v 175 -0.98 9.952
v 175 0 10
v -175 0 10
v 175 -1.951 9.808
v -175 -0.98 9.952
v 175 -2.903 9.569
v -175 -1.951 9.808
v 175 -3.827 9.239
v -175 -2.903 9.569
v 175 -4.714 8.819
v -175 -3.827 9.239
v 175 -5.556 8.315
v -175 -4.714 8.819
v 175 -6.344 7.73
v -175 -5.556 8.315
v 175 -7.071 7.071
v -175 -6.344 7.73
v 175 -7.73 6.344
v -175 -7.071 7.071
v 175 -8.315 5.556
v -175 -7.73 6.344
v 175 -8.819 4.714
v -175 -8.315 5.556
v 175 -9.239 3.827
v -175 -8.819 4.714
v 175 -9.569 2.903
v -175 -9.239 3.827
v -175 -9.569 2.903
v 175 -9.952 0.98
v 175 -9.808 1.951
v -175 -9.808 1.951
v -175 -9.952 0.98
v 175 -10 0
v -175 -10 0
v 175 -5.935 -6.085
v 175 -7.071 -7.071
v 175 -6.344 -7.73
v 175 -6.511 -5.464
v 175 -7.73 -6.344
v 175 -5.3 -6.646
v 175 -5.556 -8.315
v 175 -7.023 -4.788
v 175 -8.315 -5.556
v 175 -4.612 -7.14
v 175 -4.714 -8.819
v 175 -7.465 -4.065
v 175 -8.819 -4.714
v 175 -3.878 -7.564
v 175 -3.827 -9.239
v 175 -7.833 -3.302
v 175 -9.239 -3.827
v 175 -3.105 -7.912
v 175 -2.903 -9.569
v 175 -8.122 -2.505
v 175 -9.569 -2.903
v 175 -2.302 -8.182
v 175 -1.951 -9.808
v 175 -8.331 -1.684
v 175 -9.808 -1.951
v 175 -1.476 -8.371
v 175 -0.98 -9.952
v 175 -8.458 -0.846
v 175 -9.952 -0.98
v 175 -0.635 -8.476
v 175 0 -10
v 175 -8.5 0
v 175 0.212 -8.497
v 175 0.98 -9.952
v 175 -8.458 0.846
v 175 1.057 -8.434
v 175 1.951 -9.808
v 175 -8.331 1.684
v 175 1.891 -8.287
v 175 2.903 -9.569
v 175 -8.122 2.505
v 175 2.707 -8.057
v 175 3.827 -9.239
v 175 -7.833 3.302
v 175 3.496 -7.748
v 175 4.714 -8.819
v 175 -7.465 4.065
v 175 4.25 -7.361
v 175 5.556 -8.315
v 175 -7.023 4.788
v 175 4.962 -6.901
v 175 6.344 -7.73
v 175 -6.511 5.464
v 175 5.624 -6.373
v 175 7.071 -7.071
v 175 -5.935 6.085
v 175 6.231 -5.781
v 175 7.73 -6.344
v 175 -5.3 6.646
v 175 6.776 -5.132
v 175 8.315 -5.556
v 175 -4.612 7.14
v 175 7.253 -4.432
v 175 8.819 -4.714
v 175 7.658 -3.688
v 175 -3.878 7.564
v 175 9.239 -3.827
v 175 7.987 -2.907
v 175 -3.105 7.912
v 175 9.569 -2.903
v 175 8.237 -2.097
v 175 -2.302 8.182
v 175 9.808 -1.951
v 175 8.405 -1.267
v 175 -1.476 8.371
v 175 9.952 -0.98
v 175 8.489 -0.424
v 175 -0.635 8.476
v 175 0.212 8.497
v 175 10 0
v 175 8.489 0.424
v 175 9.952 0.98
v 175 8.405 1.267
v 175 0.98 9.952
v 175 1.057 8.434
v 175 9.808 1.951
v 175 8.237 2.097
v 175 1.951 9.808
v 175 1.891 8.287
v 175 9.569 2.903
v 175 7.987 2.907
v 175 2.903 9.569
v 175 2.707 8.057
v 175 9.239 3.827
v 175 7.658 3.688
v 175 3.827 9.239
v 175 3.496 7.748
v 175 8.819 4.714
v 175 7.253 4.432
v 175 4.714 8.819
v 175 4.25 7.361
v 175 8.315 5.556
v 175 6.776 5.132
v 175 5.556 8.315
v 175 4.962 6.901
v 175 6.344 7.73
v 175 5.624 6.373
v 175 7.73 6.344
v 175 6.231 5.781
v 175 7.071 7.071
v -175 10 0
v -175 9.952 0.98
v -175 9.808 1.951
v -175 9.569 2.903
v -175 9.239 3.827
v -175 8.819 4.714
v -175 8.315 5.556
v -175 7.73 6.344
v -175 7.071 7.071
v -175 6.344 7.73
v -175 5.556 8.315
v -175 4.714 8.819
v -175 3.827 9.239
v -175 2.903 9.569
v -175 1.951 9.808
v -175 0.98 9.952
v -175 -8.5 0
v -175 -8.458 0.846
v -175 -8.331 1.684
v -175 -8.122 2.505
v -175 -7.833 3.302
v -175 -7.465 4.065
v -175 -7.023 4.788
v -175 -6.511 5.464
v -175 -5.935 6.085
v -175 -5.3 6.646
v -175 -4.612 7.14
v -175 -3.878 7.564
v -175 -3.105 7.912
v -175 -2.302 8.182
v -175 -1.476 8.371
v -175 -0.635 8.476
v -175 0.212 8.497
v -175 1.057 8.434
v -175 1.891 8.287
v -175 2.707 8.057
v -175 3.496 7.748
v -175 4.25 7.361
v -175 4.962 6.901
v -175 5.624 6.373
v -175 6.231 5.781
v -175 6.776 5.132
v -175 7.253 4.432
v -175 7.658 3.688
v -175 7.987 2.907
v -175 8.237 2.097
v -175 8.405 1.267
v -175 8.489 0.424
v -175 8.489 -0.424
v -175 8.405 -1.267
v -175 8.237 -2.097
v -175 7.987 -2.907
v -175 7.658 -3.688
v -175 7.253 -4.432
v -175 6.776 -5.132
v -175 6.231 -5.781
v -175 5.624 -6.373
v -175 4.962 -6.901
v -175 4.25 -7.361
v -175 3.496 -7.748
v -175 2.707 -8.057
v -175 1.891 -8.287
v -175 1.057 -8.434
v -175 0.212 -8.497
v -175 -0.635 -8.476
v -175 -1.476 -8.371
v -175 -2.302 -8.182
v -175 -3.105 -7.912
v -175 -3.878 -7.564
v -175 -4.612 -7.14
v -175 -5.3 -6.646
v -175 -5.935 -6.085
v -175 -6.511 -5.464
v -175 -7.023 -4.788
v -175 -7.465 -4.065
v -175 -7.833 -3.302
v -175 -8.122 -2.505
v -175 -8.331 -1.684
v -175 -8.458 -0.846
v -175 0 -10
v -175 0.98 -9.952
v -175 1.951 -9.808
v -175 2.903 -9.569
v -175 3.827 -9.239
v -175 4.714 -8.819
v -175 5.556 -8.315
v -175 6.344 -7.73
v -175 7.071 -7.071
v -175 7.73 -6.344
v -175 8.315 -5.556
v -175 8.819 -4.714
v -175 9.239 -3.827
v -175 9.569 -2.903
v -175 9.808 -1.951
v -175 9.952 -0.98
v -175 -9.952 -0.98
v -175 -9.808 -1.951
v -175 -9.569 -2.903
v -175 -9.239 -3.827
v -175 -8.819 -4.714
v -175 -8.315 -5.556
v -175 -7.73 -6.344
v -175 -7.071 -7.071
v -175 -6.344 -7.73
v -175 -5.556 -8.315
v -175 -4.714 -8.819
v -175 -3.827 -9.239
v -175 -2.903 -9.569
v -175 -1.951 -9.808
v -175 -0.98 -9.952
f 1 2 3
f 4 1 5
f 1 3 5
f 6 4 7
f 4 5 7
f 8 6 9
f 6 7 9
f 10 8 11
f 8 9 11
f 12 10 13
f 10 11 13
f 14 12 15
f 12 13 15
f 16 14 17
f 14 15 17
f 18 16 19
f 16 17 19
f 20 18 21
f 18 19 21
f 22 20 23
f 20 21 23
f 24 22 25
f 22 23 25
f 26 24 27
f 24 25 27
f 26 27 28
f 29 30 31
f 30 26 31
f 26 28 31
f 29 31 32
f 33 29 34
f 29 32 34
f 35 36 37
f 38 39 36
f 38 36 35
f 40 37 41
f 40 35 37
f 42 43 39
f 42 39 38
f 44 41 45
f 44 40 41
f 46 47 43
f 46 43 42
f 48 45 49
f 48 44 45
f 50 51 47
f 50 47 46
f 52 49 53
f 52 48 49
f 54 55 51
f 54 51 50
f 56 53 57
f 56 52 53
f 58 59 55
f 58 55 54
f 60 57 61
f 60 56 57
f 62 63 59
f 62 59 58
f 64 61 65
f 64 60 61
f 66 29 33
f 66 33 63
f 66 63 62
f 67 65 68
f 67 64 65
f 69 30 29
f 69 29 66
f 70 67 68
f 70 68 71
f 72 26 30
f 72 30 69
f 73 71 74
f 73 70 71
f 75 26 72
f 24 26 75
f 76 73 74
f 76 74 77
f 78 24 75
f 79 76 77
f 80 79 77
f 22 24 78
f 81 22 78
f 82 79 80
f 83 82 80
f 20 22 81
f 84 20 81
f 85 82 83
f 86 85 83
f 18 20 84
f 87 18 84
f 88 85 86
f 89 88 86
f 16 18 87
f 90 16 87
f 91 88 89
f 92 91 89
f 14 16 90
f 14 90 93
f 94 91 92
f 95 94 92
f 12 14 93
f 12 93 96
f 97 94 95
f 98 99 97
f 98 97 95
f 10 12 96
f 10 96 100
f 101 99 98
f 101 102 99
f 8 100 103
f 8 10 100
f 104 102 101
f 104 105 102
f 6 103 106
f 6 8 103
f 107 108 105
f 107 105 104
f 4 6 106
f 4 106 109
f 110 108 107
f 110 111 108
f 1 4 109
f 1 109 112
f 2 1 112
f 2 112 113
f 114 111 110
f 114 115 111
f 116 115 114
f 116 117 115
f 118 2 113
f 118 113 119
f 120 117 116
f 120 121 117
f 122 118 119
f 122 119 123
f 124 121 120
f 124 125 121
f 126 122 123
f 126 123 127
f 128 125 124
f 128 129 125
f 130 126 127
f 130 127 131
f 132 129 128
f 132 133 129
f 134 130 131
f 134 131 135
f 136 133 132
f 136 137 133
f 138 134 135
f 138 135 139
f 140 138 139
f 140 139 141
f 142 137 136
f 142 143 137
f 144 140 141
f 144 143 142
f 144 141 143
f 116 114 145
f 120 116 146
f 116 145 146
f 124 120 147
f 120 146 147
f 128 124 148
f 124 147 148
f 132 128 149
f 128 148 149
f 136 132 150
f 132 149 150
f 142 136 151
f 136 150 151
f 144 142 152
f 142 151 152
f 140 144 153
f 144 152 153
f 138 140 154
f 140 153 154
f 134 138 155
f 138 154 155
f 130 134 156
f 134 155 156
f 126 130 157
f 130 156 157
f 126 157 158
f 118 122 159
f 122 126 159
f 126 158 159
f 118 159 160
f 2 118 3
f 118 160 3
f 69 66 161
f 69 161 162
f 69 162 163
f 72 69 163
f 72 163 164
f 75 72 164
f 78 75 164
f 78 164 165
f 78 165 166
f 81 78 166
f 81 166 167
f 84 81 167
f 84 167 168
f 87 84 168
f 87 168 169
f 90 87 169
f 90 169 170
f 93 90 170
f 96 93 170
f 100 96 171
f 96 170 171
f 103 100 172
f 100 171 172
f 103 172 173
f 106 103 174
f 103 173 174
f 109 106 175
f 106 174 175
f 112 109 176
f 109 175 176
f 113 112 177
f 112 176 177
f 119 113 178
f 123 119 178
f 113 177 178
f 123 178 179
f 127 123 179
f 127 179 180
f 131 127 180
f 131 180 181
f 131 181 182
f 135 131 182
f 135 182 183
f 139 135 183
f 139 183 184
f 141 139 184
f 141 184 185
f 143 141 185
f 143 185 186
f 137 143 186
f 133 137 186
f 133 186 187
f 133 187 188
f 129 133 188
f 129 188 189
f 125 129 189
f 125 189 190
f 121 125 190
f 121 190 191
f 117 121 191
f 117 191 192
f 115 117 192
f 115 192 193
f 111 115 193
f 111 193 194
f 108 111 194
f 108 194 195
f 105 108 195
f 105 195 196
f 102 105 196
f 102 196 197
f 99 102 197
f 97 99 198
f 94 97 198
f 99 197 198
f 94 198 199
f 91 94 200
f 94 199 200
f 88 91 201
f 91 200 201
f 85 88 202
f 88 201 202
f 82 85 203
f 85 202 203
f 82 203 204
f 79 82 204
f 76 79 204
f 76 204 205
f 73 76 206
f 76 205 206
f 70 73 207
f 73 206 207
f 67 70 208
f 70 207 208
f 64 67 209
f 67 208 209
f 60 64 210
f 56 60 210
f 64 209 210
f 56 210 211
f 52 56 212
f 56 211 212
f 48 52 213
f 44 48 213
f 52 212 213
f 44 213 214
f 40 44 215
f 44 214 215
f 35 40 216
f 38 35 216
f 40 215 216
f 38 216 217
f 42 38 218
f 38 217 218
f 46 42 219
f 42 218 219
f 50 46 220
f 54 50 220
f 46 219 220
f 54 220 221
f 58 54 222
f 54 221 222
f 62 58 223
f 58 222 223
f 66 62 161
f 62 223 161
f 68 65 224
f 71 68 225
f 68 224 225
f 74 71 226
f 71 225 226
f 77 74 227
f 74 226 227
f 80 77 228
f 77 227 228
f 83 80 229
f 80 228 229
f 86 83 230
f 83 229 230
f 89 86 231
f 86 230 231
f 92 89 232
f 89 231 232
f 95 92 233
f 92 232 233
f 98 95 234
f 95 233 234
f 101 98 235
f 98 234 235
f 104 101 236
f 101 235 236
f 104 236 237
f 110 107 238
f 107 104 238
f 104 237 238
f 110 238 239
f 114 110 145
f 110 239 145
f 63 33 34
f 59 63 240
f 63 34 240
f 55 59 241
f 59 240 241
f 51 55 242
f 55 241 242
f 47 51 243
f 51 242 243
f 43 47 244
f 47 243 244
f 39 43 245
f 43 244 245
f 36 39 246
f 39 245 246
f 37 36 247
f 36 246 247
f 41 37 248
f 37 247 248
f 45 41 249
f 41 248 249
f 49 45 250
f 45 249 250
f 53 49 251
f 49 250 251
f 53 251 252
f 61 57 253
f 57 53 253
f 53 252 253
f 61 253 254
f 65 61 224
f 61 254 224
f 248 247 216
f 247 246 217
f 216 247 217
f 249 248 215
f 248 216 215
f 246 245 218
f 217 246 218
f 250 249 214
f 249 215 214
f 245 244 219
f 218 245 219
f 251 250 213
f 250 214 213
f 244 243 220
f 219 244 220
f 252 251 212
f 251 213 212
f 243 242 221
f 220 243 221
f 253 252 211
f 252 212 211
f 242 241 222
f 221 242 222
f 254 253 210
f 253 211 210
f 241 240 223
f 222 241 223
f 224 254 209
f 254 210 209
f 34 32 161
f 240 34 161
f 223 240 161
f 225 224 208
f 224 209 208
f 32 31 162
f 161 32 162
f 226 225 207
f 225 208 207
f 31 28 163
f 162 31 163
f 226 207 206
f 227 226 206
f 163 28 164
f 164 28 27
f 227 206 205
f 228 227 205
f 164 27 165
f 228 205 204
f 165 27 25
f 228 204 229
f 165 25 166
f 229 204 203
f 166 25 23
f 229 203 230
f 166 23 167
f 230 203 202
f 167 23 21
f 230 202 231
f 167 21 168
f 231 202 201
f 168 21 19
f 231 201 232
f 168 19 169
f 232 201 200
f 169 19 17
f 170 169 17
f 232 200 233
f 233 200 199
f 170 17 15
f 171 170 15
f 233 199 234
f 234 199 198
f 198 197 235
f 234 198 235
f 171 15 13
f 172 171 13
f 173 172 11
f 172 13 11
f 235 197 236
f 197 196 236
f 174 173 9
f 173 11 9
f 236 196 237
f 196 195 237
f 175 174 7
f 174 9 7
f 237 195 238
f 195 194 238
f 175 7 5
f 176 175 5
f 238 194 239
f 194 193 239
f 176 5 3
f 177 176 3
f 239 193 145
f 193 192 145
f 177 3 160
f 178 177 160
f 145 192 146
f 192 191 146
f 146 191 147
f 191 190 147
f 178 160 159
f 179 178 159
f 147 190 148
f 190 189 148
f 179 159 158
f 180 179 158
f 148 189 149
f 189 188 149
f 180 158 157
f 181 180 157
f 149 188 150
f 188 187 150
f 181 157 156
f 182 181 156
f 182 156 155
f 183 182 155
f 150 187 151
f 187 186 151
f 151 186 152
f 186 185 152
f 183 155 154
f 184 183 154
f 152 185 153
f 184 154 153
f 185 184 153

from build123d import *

# Parameters (mm, degrees)
F0_W          = 350
F0_H          = 20
F1_DEPTH      = 10
F1_DEPTH_BACK = 10
F2_R          = 8.5
F3_DEPTH      = 355.6


with BuildPart() as f1:
    # F0 (on Top) → F1 (new body, two sides)
    with BuildSketch(Plane.XY) as f1_sk:
        Rectangle(F0_W, F0_H)
    extrude(amount=F1_DEPTH)
    extrude(f1_sk.sketch, amount=-F1_DEPTH_BACK)

    # F2 (on face) → F3 (cut)
    with BuildSketch(Plane(origin=(-175, 0, 0), x_dir=(0, -1, 0), z_dir=(-1, 0, 0))):
        with BuildLine():
            ThreePointArc((0, 10), (7.071068, 7.071068), (10, 0))
            Line((10, 0), (10, 10))
            Line((10, 10), (0, 10))
        make_face()
        with BuildLine():
            Line((10, -10), (10, 0))
            ThreePointArc((10, 0), (7.071068, -7.071068), (0, -10))
            Line((0, -10), (10, -10))
        make_face()
        with BuildLine():
            ThreePointArc((-10, 0), (-7.071068, 7.071068), (0, 10))
            Line((0, 10), (-10, 10))
            Line((-10, 10), (-10, 0))
        make_face()
        with BuildLine():
            Line((-10, -10), (0, -10))
            ThreePointArc((0, -10), (-7.071068, -7.071068), (-10, 0))
            Line((-10, 0), (-10, -10))
        make_face()
        Circle(F2_R)
    extrude(amount=-F3_DEPTH, mode=Mode.SUBTRACT)


solid = f1.part
